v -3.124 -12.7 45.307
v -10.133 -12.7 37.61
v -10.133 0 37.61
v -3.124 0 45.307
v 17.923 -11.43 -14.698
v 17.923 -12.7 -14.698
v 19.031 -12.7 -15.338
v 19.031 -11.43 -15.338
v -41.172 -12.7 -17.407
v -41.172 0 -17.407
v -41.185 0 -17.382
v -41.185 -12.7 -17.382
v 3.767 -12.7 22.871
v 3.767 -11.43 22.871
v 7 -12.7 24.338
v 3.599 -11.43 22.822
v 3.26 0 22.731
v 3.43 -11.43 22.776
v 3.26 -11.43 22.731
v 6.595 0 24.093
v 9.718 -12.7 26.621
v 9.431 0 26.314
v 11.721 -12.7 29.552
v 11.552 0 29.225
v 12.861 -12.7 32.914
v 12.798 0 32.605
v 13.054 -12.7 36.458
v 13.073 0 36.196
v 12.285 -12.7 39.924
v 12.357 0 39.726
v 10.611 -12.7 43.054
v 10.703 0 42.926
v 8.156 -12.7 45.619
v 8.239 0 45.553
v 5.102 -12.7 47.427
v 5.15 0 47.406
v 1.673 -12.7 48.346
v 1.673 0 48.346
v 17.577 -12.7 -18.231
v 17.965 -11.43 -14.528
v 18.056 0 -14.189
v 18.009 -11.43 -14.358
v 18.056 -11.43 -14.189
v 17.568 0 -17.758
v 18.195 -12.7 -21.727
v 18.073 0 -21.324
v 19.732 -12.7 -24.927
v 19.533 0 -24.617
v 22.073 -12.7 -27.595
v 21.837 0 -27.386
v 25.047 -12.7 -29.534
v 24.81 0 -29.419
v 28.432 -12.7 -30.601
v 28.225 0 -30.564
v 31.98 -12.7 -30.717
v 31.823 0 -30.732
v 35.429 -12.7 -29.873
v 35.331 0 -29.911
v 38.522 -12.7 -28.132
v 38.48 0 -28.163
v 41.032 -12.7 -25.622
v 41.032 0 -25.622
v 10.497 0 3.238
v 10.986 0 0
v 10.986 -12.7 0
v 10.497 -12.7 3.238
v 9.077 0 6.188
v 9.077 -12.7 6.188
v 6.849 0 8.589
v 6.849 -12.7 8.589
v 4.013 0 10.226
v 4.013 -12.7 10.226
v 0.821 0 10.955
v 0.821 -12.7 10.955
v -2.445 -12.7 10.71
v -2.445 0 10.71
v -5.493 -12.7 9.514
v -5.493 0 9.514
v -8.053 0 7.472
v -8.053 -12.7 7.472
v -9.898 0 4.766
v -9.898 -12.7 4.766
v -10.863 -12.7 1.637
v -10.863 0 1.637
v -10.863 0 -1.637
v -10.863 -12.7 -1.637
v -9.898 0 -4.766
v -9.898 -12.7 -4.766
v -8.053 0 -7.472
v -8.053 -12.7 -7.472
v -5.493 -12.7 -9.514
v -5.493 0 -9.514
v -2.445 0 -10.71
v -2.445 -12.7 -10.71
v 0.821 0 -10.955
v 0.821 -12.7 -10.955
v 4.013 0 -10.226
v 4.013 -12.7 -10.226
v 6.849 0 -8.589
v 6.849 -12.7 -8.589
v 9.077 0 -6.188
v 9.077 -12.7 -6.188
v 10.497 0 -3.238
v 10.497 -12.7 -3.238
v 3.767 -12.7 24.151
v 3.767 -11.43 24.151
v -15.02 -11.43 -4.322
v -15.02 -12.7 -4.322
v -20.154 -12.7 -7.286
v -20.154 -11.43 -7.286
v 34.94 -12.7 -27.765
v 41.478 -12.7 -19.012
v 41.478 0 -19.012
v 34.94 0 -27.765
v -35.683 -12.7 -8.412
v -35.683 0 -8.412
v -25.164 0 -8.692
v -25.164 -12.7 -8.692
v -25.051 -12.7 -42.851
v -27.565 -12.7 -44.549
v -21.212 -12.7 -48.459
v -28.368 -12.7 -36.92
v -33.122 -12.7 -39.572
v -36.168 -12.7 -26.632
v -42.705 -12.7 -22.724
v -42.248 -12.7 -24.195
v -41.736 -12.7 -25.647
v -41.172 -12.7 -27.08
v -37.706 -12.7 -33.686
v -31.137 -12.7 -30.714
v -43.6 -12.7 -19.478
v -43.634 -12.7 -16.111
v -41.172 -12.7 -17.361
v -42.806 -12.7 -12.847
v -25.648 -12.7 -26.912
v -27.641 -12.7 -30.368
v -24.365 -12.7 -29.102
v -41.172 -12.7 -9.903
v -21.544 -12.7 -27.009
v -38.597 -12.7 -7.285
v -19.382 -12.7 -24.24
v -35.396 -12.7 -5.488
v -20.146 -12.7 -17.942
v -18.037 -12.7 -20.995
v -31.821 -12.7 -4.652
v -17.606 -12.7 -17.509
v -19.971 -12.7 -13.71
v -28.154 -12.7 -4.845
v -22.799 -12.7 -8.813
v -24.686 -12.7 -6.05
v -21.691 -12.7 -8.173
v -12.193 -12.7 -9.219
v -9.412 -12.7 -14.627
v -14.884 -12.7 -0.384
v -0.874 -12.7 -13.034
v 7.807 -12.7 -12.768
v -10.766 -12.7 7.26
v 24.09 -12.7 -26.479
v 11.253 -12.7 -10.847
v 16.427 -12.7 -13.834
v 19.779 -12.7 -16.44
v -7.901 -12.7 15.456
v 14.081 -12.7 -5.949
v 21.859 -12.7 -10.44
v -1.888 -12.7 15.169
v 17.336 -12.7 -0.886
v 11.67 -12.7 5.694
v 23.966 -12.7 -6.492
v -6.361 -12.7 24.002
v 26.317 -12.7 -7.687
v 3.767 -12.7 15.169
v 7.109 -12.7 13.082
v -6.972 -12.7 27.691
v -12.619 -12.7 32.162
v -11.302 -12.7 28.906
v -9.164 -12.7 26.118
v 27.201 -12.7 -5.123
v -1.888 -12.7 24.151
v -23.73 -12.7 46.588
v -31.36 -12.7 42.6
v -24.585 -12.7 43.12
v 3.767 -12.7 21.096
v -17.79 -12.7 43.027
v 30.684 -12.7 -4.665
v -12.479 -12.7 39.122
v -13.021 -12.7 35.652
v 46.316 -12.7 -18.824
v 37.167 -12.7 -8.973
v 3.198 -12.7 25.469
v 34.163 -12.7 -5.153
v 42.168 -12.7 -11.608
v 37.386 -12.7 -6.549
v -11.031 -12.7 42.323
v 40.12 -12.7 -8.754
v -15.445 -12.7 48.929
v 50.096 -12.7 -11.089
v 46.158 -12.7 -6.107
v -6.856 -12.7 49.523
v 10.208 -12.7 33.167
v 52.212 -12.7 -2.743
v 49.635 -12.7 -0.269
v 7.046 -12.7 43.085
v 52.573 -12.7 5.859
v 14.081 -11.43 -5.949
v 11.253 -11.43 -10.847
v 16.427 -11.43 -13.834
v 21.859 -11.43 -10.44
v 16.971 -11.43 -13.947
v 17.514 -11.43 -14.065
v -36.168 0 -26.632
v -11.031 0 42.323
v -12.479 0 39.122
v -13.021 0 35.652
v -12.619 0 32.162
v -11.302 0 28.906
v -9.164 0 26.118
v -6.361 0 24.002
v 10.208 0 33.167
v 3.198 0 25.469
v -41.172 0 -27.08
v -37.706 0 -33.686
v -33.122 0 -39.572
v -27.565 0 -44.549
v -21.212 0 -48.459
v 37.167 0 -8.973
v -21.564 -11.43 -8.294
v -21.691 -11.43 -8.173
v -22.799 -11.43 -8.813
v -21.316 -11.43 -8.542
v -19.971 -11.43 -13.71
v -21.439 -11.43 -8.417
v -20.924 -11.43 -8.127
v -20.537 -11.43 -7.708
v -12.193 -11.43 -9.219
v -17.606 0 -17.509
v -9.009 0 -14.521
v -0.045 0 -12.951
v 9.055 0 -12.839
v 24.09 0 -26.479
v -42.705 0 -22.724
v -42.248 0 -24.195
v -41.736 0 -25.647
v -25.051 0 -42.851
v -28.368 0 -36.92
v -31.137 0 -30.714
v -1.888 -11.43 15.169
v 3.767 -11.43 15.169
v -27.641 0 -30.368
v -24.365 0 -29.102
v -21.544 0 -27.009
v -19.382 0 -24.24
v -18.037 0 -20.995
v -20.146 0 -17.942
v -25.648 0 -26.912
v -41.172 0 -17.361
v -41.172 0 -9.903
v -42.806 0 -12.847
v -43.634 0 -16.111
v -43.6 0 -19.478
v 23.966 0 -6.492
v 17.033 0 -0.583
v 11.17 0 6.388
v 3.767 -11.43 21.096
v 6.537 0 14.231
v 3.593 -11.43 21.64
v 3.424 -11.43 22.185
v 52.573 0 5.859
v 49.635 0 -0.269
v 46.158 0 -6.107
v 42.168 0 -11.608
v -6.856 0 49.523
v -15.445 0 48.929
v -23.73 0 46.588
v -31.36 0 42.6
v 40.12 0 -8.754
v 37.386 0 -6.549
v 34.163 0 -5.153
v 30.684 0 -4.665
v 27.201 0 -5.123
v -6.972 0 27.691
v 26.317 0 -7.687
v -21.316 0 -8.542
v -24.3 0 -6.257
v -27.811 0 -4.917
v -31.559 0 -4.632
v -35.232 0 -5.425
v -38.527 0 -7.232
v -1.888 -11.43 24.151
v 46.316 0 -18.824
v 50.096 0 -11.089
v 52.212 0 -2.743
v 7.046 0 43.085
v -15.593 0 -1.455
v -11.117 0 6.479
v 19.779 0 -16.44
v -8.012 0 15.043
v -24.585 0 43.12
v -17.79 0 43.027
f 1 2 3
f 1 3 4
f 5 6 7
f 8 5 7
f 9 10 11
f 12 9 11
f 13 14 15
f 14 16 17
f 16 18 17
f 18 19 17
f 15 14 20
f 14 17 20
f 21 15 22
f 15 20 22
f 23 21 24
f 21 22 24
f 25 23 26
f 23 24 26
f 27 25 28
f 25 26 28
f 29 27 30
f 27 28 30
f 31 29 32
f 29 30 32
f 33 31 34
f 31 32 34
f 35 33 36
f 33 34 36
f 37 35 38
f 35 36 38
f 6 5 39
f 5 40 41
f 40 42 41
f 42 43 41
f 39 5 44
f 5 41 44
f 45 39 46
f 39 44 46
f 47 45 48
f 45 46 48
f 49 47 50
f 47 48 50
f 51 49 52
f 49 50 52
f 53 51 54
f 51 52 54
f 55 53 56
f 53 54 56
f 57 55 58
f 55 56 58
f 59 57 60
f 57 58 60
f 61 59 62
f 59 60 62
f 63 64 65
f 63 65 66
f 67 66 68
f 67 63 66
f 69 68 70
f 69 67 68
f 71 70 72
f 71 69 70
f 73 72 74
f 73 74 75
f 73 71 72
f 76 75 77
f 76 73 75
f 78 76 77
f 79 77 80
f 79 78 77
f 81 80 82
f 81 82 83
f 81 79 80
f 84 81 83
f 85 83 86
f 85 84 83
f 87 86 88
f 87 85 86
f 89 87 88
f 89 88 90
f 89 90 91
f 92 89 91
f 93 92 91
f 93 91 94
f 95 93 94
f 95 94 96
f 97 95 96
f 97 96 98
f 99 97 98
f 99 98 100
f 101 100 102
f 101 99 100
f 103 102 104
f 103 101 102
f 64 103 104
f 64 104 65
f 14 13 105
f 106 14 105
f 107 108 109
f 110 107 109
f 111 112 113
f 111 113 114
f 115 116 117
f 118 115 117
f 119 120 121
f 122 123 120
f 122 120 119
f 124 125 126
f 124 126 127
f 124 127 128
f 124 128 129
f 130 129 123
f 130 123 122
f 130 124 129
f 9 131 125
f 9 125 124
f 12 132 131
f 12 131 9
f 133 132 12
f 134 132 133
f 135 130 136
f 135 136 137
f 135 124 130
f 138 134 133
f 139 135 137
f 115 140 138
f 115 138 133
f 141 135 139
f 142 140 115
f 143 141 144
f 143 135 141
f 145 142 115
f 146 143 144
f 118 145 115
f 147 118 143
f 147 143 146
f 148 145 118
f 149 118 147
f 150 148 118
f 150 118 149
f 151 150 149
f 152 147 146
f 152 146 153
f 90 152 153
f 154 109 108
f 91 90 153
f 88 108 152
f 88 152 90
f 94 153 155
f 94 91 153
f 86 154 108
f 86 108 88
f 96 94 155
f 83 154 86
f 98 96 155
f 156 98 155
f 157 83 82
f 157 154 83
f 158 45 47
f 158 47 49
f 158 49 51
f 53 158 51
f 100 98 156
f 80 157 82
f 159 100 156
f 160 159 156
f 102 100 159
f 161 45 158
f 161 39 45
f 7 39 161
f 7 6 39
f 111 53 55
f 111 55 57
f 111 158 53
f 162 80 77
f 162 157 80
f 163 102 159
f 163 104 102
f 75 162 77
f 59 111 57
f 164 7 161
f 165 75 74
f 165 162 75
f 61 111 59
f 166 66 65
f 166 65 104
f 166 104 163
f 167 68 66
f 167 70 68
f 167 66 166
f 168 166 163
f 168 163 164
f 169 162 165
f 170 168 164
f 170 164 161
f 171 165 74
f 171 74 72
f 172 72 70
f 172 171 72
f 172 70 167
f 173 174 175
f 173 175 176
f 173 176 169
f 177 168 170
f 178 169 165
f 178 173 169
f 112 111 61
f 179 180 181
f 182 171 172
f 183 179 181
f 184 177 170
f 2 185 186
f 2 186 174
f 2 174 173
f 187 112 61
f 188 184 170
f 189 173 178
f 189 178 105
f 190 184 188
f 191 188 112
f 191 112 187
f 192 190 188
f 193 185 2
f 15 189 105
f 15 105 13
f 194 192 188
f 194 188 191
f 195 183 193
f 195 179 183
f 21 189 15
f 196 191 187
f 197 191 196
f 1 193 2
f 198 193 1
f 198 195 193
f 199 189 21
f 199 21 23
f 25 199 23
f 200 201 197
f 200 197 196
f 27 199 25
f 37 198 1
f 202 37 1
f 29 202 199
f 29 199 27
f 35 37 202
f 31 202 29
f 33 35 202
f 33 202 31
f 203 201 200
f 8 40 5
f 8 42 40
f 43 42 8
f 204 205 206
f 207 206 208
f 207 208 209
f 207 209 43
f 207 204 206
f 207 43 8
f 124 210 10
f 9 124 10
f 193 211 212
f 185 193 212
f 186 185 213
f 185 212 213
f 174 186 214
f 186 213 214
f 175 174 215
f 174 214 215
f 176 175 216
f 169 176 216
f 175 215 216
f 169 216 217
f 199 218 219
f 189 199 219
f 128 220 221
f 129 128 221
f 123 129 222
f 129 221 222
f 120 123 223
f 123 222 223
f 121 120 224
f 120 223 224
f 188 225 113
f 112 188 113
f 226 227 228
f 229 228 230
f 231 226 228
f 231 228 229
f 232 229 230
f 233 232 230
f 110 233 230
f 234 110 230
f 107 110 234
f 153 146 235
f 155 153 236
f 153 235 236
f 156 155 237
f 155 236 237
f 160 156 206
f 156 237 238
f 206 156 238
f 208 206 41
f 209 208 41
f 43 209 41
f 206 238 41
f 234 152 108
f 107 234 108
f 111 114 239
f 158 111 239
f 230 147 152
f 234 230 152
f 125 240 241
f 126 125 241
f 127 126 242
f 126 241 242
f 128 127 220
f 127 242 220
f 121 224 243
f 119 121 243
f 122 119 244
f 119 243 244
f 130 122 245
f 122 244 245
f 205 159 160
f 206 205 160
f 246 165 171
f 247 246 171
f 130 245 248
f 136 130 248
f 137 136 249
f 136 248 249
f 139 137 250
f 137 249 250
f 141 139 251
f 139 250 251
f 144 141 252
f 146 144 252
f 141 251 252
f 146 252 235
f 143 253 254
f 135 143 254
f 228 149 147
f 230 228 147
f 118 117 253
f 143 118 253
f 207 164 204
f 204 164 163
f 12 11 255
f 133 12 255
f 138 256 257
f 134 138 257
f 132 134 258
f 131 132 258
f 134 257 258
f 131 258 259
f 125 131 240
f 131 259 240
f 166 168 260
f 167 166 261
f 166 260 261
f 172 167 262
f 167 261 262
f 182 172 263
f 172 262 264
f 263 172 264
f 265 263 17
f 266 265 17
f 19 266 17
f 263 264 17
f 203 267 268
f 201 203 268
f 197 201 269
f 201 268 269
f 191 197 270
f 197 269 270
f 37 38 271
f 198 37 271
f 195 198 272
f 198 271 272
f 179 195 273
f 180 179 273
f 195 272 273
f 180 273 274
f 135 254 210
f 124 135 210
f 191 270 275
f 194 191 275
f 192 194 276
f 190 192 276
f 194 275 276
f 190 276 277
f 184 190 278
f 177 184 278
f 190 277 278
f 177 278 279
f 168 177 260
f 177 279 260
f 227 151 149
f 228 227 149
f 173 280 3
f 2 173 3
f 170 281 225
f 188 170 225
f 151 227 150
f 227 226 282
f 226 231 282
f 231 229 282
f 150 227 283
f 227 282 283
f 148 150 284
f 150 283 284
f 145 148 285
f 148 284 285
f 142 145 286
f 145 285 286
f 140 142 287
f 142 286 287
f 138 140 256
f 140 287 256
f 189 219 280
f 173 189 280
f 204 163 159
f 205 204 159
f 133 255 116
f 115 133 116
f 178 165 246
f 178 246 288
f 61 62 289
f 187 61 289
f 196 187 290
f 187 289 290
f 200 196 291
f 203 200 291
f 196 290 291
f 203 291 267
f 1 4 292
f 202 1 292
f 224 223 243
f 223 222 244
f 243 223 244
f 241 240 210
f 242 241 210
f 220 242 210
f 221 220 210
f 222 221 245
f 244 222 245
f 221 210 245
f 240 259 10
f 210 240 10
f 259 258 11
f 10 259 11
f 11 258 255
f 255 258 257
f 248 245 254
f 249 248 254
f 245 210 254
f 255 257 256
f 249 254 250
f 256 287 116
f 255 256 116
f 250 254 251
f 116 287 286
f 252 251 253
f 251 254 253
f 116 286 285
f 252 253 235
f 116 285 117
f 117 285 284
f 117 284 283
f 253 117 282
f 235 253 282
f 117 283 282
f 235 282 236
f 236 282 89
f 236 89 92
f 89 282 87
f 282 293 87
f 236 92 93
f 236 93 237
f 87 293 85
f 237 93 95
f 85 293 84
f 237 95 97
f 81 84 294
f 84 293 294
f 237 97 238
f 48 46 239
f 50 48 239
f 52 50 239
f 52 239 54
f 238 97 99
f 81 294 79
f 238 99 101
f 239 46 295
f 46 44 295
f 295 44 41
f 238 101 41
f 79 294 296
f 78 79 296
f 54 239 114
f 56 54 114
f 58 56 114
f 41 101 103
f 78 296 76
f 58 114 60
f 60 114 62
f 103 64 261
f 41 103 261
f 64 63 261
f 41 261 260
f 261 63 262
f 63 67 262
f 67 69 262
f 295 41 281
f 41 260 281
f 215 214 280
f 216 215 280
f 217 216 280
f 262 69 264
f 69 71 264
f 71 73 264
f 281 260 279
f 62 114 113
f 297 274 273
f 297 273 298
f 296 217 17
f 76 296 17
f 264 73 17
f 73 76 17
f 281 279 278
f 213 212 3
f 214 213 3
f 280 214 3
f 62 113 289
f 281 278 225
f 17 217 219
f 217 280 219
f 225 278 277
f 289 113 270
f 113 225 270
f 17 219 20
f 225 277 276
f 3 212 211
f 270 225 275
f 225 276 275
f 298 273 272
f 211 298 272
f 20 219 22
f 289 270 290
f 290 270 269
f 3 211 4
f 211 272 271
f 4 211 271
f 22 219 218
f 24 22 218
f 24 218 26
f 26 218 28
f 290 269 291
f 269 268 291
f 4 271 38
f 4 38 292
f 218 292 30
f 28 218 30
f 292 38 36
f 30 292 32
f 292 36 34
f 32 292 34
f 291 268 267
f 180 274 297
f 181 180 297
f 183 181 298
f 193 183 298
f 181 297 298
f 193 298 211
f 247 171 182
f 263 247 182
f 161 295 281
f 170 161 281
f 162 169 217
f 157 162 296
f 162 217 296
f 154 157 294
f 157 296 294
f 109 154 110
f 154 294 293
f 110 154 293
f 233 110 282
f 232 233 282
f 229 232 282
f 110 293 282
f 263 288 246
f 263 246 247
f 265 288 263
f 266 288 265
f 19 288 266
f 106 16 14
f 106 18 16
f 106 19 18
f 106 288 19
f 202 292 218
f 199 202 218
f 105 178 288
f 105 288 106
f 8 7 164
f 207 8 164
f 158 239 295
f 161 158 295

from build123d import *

# Parameters (mm, degrees)
F0_R     = 10.9855
F1_DEPTH = 12.7
F2_W     = 5.655189
F2_H     = 8.981772
F3_DEPTH = 1.27


with BuildPart() as f1:
    # F0 (on Front) → F1 (new body)
    with BuildSketch(Plane.XZ):
        with BuildLine():
            ThreePointArc((-6.360809, 24.00158), (-11.117425, 6.479342), (-21.316083, -8.542029))
            ThreePointArc((-21.316083, -8.542029), (-31.558535, -4.631694), (-41.171763, -9.902784))
            Line((-41.171763, -9.902784), (-41.171763, -17.360528))
            Line((-41.171763, -17.360528), (-35.683101, -8.411922))
            Line((-35.683101, -8.411922), (-25.163529, -8.691618))
            Line((-25.163529, -8.691618), (-20.145967, -17.941683))
            Line((-20.145967, -17.941683), (-25.647977, -26.912052))
            Line((-25.647977, -26.912052), (-36.167549, -26.632355))
            Line((-36.167549, -26.632355), (-41.171763, -17.406898))
            Line((-41.171763, -17.406898), (-41.171763, -27.080146))
            ThreePointArc((-41.171763, -27.080146), (-33.122191, -39.571535), (-21.212272, -48.458844))
            ThreePointArc((-21.212272, -48.458844), (-26.776178, -39.923045), (-31.136971, -30.714332))
            ThreePointArc((-31.136971, -30.714332), (-21.543573, -27.009484), (-17.605574, -17.509412))
            ThreePointArc((-17.605574, -17.509412), (-0.044829, -12.950713), (18.055655, -14.189255))
            ThreePointArc((18.055655, -14.189255), (24.810198, -29.419446), (41.032453, -25.621946))
            ThreePointArc((41.032453, -25.621946), (50.096223, -11.088822), (52.572726, 5.859055))
            ThreePointArc((52.572726, 5.859055), (47.962461, -3.227328), (42.167877, -11.608242))
            ThreePointArc((42.167877, -11.608242), (34.162685, -5.152539), (23.966383, -6.492168))
            ThreePointArc((23.966383, -6.492168), (11.169988, 6.388301), (3.260428, 22.731284))
            ThreePointArc((3.260428, 22.731284), (13.072888, 36.195984), (1.67303, 48.346119))
            ThreePointArc((1.67303, 48.346119), (-15.44491, 48.929013), (-31.360454, 42.599789))
            ThreePointArc((-31.360454, 42.599789), (-21.186282, 43.150373), (-11.030906, 42.322574))
            ThreePointArc((-11.030906, 42.322574), (-12.619113, 32.162023), (-6.360809, 24.00158))
        make_face()
        Circle(F0_R, mode=Mode.SUBTRACT)
        Polygon((37.166687, -8.97331), (41.477768, -19.011964), (34.939579, -27.764796), (24.09031, -26.478974), (19.77923, -16.440321), (26.317418, -7.687489), align=None, mode=Mode.SUBTRACT)
        Polygon((7.046263, 43.085256), (10.207559, 33.166528), (3.198336, 25.469401), (-6.972183, 27.691002), (-10.133479, 37.609731), (-3.124256, 45.306858), align=None, mode=Mode.SUBTRACT)
        with BuildLine():
            Line((-41.171763, -17.360528), (-41.171763, -9.902784))
            ThreePointArc((-41.171763, -9.902784), (-43.63394, -16.110682), (-42.705482, -22.724174))
            ThreePointArc((-42.705482, -22.724174), (-41.998805, -24.92335), (-41.171763, -27.080146))
            Line((-41.171763, -27.080146), (-41.171763, -17.406898))
            Line((-41.171763, -17.406898), (-41.185111, -17.38229))
            Line((-41.185111, -17.38229), (-41.171763, -17.360528))
        make_face()
    extrude(amount=F1_DEPTH)

    # F2 (on face) → F3 (cut)
    with BuildSketch(Plane.XZ.offset(12.7)):
        with Locations((0.939673, 19.659774)):
            Rectangle(F2_W, F2_H)
        Polygon((-22.798719, -8.812781), (-19.971124, -13.710318), (-12.192681, -9.219432), (-15.020276, -4.321895), align=None)
        Polygon((19.031452, -15.337879), (21.859046, -10.440342), (14.080603, -5.949455), (11.253008, -10.846993), align=None)
    extrude(amount=-F3_DEPTH, mode=Mode.SUBTRACT)


solid = f1.part
